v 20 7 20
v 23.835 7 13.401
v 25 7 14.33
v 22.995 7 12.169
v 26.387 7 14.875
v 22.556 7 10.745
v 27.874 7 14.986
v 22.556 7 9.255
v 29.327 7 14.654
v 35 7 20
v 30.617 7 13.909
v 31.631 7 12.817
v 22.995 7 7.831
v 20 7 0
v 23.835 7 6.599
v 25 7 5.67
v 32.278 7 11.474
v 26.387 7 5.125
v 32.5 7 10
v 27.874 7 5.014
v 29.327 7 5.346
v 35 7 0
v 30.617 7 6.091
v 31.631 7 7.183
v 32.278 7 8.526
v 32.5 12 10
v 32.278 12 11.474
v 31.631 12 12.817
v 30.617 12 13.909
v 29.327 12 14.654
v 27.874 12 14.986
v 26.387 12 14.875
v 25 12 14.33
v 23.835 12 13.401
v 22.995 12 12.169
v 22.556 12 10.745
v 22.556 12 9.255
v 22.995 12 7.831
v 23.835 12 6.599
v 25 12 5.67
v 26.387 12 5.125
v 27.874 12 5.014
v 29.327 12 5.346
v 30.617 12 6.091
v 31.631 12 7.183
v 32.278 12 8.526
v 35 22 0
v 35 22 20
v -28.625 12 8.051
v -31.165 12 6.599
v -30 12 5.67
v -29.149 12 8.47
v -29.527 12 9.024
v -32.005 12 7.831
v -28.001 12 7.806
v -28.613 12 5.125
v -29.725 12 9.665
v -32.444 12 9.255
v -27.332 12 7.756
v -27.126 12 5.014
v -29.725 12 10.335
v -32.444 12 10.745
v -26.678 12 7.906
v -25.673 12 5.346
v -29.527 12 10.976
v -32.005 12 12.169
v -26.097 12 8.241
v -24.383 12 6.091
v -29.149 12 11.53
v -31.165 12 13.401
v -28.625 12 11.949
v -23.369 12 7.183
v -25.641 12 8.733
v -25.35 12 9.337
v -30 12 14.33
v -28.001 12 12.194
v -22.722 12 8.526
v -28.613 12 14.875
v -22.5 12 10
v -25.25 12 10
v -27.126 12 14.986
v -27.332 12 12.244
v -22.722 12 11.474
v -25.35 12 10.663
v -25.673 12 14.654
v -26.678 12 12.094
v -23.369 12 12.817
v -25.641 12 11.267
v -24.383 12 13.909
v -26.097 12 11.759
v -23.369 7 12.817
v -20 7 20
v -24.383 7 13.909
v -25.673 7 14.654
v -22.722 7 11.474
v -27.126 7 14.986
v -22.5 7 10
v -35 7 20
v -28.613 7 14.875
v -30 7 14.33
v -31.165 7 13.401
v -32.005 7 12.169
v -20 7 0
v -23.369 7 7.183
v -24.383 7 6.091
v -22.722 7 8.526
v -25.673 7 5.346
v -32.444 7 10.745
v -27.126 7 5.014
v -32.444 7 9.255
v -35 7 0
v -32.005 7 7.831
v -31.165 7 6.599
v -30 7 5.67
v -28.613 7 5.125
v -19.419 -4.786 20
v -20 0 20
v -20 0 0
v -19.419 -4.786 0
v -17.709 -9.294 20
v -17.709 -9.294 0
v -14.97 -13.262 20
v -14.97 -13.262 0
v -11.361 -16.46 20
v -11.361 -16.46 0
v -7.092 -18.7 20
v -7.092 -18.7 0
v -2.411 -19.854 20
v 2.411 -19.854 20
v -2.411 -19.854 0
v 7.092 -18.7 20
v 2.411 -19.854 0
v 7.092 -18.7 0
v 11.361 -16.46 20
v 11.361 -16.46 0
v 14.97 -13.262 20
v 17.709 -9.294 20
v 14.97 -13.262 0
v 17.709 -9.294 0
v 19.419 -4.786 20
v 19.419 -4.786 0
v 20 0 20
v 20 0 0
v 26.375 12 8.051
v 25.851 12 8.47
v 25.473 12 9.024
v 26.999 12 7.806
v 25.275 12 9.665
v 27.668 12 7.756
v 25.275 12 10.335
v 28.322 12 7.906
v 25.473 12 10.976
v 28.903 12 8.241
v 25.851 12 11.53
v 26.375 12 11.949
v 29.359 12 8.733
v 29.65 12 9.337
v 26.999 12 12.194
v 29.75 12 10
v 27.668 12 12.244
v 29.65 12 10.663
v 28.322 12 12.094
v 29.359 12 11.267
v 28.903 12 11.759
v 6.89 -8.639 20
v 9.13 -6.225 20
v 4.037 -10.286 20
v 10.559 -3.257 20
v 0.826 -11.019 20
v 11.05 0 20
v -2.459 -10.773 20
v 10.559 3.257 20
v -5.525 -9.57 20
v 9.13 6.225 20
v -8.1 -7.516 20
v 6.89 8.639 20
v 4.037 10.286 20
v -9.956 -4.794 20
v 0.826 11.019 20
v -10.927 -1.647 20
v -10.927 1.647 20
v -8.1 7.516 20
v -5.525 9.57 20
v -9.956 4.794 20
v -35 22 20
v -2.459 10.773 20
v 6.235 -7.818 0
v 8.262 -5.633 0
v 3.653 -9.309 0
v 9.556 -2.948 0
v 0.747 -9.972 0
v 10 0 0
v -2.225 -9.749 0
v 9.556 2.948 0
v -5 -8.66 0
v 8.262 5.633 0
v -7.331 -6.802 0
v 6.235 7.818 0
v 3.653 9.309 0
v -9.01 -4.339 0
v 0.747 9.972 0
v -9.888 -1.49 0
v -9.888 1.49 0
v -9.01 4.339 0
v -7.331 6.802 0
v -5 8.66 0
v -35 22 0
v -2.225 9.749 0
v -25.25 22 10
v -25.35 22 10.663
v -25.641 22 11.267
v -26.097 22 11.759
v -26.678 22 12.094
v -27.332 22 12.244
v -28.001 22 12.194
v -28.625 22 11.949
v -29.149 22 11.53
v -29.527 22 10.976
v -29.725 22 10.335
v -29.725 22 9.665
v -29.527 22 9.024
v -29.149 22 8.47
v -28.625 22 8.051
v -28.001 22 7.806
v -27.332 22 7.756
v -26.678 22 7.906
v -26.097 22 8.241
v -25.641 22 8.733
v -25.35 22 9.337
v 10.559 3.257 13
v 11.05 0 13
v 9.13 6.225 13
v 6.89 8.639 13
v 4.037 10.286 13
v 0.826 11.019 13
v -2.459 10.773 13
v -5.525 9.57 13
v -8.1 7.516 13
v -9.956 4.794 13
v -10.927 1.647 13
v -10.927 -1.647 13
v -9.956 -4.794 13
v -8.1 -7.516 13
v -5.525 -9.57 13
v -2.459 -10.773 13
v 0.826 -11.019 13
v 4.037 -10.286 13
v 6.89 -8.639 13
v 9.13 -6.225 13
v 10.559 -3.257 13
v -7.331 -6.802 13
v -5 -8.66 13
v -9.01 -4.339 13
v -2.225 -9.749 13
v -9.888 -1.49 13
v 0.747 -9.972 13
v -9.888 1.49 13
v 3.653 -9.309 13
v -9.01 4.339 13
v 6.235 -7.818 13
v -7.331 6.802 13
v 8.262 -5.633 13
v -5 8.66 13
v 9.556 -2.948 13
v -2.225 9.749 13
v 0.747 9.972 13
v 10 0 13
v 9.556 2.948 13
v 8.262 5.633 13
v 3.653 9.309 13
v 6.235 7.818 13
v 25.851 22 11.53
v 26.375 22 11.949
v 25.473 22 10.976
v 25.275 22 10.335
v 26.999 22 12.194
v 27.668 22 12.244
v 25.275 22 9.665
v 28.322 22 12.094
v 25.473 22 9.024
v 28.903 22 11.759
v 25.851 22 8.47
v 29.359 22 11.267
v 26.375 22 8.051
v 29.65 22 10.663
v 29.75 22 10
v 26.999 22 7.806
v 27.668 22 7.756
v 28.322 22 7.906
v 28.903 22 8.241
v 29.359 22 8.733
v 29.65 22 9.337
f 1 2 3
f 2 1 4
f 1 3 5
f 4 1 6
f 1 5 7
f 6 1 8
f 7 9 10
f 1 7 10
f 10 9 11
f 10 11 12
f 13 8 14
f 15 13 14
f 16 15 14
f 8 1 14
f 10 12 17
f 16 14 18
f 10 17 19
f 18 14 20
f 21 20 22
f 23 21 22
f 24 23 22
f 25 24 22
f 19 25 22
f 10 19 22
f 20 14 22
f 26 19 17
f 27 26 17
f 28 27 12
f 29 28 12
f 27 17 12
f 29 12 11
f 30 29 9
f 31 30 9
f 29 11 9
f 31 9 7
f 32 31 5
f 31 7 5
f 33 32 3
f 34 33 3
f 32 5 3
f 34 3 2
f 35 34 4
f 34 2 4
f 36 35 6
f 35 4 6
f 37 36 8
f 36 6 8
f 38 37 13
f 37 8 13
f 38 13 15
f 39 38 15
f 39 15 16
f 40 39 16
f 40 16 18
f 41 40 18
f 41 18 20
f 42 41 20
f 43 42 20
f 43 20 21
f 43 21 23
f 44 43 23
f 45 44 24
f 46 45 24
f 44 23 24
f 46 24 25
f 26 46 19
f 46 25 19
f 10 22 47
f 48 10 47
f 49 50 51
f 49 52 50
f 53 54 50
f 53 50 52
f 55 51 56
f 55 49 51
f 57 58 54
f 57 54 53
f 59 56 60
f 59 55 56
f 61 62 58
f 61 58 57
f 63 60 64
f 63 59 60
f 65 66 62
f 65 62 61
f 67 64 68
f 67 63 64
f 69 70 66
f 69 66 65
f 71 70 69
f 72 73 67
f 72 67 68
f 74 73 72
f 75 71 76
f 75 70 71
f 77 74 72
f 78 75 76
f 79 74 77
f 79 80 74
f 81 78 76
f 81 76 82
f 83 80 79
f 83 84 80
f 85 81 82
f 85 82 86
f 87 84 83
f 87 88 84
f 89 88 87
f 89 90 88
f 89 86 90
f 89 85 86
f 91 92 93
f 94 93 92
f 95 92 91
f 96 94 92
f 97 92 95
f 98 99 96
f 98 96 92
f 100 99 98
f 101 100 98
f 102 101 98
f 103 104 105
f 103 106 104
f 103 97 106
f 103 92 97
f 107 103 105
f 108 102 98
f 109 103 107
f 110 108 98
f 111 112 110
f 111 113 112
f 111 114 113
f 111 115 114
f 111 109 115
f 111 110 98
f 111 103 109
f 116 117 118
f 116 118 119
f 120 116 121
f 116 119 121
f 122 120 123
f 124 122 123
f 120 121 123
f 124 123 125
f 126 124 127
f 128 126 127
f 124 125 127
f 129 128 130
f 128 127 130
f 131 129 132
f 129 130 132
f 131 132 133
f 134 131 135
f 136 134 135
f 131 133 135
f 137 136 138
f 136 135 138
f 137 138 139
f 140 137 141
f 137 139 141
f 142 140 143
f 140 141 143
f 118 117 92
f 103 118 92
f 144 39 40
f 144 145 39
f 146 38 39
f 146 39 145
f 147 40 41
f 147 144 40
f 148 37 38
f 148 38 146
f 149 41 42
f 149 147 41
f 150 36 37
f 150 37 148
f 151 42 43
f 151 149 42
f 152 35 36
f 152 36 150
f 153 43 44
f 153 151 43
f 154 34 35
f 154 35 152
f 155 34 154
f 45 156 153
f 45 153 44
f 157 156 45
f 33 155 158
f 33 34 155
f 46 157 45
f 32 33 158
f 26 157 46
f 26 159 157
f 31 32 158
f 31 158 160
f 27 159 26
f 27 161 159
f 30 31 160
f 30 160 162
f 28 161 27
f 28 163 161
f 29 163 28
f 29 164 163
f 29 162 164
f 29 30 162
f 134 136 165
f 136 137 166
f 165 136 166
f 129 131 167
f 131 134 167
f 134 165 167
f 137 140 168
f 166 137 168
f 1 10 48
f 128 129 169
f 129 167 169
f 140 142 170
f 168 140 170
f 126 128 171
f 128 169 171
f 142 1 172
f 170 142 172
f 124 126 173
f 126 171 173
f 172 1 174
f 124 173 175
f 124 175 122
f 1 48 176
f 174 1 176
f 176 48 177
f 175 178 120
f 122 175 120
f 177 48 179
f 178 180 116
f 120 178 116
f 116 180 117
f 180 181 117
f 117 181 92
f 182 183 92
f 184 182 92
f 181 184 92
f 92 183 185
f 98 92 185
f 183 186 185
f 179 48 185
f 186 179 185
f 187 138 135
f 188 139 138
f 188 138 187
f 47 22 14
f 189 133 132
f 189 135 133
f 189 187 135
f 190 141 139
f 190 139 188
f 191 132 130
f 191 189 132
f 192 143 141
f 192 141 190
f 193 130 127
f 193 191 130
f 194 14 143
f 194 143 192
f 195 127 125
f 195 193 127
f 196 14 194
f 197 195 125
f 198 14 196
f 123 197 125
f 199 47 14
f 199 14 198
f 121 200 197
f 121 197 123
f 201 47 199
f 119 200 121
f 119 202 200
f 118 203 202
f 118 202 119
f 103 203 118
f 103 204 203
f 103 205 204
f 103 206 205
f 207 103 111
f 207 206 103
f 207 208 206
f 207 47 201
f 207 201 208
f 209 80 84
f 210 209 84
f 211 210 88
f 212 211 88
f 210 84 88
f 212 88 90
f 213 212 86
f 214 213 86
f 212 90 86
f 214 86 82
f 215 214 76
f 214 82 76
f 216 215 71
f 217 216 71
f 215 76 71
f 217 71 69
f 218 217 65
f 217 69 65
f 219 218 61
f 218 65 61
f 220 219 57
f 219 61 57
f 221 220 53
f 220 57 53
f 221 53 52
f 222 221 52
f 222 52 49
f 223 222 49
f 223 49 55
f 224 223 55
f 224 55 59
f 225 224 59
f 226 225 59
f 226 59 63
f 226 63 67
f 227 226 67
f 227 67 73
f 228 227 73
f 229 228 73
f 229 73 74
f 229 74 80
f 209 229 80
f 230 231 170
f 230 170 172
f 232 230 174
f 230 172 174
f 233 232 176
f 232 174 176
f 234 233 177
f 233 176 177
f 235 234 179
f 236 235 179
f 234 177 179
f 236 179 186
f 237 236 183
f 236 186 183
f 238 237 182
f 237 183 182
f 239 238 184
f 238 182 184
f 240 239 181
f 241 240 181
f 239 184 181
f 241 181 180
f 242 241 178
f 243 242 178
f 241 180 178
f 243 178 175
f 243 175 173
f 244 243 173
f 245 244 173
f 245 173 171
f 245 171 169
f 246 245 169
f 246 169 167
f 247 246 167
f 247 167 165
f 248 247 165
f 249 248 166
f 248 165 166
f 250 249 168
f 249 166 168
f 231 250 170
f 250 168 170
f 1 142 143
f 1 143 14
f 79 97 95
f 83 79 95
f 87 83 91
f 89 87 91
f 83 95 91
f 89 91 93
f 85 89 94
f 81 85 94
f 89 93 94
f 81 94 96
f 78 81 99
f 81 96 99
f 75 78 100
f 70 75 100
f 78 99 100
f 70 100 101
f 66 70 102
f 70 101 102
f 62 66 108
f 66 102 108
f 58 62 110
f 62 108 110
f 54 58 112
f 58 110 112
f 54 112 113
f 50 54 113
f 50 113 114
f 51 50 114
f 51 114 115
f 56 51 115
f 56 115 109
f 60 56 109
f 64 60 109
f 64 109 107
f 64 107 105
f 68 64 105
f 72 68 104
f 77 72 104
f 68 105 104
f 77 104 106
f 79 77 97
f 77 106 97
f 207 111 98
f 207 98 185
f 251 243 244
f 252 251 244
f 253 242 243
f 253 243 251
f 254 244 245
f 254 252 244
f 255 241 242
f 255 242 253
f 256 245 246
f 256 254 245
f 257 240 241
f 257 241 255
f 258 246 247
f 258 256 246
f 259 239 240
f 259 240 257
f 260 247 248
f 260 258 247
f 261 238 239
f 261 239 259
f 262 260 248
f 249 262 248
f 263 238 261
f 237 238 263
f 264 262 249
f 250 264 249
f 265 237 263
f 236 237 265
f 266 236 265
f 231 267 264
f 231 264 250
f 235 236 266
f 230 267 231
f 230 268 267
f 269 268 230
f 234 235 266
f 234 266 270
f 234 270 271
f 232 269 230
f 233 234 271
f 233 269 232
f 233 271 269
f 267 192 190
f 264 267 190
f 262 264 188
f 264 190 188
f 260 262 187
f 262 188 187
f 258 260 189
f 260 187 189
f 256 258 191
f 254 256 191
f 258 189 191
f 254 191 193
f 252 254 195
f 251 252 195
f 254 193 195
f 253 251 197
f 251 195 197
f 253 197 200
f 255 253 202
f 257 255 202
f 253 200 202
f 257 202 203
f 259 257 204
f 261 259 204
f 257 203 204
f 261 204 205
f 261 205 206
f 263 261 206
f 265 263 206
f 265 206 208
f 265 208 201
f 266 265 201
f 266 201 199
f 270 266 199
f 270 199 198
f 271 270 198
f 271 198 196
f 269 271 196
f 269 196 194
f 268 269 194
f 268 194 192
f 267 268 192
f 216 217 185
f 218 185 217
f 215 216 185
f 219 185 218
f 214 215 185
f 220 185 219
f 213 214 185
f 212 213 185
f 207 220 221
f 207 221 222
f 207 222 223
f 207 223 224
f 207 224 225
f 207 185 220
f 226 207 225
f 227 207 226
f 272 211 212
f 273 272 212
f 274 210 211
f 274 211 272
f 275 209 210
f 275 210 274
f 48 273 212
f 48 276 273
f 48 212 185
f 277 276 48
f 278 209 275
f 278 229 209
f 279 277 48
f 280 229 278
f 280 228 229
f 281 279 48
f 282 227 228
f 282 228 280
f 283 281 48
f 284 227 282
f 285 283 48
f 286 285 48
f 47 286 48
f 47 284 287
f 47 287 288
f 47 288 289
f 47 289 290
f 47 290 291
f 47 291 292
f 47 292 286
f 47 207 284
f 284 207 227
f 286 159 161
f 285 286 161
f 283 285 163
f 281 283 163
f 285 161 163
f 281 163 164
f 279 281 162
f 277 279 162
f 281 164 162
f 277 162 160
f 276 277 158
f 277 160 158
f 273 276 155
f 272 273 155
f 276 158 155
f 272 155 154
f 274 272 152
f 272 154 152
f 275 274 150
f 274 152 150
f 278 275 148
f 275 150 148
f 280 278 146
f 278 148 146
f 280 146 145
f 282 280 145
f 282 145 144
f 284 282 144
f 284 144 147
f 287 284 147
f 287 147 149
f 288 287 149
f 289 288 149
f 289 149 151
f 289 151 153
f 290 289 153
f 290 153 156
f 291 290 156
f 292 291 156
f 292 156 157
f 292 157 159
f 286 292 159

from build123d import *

# Parameters (mm, degrees)
PAD_DEPTH       = 20
SKETCH006_R     = 10
POCKET_DEPTH    = 20.001
SKETCH005_R     = 11.05
POCKET001_DEPTH = 7
SKETCH002_R     = 2.25
POCKET002_DEPTH = 15.001
SKETCH003_R     = 5
POCKET003_DEPTH = 5


with BuildPart() as part:
    # Sketch → Pad (new body)
    with BuildSketch(Plane.XY):
        with BuildLine():
            Line((-35, 22), (35, 22))
            Line((35, 7), (35, 22))
            Line((20, 7), (35, 7))
            Line((20, 0), (20, 7))
            ThreePointArc((-20, 0), (0, -20), (20, 0))
            Line((-20, 0), (-20, 7))
            Line((-20, 7), (-35, 7))
            Line((-35, 7), (-35, 22))
        make_face()
    extrude(amount=PAD_DEPTH)

    # Sketch006 → Pocket (cut, through all)
    with BuildSketch(Plane(origin=(0, 0, 0), x_dir=(1, 0, 0), z_dir=(0, 0, -1))):
        Circle(SKETCH006_R)
    extrude(amount=-POCKET_DEPTH, mode=Mode.SUBTRACT)

    # Sketch005 → Pocket001 (cut)
    with BuildSketch(Plane.XY.offset(20)):
        Circle(SKETCH005_R)
    extrude(amount=-POCKET001_DEPTH, mode=Mode.SUBTRACT)

    # Sketch002 → Pocket002 (cut, through all)
    with BuildSketch(Plane.XZ.offset(-7)):
        with Locations((-27.5, 10)):
            Circle(SKETCH002_R)
        with Locations((27.5, 10)):
            Circle(SKETCH002_R)
    extrude(amount=-POCKET002_DEPTH, mode=Mode.SUBTRACT)

    # Sketch003 → Pocket003 (cut)
    with BuildSketch(Plane.XZ.offset(-7)):
        with Locations((-27.5, 10)):
            Circle(SKETCH003_R)
        with Locations((27.5, 10)):
            Circle(SKETCH003_R)
    extrude(amount=-POCKET003_DEPTH, mode=Mode.SUBTRACT)


solid = part.part
